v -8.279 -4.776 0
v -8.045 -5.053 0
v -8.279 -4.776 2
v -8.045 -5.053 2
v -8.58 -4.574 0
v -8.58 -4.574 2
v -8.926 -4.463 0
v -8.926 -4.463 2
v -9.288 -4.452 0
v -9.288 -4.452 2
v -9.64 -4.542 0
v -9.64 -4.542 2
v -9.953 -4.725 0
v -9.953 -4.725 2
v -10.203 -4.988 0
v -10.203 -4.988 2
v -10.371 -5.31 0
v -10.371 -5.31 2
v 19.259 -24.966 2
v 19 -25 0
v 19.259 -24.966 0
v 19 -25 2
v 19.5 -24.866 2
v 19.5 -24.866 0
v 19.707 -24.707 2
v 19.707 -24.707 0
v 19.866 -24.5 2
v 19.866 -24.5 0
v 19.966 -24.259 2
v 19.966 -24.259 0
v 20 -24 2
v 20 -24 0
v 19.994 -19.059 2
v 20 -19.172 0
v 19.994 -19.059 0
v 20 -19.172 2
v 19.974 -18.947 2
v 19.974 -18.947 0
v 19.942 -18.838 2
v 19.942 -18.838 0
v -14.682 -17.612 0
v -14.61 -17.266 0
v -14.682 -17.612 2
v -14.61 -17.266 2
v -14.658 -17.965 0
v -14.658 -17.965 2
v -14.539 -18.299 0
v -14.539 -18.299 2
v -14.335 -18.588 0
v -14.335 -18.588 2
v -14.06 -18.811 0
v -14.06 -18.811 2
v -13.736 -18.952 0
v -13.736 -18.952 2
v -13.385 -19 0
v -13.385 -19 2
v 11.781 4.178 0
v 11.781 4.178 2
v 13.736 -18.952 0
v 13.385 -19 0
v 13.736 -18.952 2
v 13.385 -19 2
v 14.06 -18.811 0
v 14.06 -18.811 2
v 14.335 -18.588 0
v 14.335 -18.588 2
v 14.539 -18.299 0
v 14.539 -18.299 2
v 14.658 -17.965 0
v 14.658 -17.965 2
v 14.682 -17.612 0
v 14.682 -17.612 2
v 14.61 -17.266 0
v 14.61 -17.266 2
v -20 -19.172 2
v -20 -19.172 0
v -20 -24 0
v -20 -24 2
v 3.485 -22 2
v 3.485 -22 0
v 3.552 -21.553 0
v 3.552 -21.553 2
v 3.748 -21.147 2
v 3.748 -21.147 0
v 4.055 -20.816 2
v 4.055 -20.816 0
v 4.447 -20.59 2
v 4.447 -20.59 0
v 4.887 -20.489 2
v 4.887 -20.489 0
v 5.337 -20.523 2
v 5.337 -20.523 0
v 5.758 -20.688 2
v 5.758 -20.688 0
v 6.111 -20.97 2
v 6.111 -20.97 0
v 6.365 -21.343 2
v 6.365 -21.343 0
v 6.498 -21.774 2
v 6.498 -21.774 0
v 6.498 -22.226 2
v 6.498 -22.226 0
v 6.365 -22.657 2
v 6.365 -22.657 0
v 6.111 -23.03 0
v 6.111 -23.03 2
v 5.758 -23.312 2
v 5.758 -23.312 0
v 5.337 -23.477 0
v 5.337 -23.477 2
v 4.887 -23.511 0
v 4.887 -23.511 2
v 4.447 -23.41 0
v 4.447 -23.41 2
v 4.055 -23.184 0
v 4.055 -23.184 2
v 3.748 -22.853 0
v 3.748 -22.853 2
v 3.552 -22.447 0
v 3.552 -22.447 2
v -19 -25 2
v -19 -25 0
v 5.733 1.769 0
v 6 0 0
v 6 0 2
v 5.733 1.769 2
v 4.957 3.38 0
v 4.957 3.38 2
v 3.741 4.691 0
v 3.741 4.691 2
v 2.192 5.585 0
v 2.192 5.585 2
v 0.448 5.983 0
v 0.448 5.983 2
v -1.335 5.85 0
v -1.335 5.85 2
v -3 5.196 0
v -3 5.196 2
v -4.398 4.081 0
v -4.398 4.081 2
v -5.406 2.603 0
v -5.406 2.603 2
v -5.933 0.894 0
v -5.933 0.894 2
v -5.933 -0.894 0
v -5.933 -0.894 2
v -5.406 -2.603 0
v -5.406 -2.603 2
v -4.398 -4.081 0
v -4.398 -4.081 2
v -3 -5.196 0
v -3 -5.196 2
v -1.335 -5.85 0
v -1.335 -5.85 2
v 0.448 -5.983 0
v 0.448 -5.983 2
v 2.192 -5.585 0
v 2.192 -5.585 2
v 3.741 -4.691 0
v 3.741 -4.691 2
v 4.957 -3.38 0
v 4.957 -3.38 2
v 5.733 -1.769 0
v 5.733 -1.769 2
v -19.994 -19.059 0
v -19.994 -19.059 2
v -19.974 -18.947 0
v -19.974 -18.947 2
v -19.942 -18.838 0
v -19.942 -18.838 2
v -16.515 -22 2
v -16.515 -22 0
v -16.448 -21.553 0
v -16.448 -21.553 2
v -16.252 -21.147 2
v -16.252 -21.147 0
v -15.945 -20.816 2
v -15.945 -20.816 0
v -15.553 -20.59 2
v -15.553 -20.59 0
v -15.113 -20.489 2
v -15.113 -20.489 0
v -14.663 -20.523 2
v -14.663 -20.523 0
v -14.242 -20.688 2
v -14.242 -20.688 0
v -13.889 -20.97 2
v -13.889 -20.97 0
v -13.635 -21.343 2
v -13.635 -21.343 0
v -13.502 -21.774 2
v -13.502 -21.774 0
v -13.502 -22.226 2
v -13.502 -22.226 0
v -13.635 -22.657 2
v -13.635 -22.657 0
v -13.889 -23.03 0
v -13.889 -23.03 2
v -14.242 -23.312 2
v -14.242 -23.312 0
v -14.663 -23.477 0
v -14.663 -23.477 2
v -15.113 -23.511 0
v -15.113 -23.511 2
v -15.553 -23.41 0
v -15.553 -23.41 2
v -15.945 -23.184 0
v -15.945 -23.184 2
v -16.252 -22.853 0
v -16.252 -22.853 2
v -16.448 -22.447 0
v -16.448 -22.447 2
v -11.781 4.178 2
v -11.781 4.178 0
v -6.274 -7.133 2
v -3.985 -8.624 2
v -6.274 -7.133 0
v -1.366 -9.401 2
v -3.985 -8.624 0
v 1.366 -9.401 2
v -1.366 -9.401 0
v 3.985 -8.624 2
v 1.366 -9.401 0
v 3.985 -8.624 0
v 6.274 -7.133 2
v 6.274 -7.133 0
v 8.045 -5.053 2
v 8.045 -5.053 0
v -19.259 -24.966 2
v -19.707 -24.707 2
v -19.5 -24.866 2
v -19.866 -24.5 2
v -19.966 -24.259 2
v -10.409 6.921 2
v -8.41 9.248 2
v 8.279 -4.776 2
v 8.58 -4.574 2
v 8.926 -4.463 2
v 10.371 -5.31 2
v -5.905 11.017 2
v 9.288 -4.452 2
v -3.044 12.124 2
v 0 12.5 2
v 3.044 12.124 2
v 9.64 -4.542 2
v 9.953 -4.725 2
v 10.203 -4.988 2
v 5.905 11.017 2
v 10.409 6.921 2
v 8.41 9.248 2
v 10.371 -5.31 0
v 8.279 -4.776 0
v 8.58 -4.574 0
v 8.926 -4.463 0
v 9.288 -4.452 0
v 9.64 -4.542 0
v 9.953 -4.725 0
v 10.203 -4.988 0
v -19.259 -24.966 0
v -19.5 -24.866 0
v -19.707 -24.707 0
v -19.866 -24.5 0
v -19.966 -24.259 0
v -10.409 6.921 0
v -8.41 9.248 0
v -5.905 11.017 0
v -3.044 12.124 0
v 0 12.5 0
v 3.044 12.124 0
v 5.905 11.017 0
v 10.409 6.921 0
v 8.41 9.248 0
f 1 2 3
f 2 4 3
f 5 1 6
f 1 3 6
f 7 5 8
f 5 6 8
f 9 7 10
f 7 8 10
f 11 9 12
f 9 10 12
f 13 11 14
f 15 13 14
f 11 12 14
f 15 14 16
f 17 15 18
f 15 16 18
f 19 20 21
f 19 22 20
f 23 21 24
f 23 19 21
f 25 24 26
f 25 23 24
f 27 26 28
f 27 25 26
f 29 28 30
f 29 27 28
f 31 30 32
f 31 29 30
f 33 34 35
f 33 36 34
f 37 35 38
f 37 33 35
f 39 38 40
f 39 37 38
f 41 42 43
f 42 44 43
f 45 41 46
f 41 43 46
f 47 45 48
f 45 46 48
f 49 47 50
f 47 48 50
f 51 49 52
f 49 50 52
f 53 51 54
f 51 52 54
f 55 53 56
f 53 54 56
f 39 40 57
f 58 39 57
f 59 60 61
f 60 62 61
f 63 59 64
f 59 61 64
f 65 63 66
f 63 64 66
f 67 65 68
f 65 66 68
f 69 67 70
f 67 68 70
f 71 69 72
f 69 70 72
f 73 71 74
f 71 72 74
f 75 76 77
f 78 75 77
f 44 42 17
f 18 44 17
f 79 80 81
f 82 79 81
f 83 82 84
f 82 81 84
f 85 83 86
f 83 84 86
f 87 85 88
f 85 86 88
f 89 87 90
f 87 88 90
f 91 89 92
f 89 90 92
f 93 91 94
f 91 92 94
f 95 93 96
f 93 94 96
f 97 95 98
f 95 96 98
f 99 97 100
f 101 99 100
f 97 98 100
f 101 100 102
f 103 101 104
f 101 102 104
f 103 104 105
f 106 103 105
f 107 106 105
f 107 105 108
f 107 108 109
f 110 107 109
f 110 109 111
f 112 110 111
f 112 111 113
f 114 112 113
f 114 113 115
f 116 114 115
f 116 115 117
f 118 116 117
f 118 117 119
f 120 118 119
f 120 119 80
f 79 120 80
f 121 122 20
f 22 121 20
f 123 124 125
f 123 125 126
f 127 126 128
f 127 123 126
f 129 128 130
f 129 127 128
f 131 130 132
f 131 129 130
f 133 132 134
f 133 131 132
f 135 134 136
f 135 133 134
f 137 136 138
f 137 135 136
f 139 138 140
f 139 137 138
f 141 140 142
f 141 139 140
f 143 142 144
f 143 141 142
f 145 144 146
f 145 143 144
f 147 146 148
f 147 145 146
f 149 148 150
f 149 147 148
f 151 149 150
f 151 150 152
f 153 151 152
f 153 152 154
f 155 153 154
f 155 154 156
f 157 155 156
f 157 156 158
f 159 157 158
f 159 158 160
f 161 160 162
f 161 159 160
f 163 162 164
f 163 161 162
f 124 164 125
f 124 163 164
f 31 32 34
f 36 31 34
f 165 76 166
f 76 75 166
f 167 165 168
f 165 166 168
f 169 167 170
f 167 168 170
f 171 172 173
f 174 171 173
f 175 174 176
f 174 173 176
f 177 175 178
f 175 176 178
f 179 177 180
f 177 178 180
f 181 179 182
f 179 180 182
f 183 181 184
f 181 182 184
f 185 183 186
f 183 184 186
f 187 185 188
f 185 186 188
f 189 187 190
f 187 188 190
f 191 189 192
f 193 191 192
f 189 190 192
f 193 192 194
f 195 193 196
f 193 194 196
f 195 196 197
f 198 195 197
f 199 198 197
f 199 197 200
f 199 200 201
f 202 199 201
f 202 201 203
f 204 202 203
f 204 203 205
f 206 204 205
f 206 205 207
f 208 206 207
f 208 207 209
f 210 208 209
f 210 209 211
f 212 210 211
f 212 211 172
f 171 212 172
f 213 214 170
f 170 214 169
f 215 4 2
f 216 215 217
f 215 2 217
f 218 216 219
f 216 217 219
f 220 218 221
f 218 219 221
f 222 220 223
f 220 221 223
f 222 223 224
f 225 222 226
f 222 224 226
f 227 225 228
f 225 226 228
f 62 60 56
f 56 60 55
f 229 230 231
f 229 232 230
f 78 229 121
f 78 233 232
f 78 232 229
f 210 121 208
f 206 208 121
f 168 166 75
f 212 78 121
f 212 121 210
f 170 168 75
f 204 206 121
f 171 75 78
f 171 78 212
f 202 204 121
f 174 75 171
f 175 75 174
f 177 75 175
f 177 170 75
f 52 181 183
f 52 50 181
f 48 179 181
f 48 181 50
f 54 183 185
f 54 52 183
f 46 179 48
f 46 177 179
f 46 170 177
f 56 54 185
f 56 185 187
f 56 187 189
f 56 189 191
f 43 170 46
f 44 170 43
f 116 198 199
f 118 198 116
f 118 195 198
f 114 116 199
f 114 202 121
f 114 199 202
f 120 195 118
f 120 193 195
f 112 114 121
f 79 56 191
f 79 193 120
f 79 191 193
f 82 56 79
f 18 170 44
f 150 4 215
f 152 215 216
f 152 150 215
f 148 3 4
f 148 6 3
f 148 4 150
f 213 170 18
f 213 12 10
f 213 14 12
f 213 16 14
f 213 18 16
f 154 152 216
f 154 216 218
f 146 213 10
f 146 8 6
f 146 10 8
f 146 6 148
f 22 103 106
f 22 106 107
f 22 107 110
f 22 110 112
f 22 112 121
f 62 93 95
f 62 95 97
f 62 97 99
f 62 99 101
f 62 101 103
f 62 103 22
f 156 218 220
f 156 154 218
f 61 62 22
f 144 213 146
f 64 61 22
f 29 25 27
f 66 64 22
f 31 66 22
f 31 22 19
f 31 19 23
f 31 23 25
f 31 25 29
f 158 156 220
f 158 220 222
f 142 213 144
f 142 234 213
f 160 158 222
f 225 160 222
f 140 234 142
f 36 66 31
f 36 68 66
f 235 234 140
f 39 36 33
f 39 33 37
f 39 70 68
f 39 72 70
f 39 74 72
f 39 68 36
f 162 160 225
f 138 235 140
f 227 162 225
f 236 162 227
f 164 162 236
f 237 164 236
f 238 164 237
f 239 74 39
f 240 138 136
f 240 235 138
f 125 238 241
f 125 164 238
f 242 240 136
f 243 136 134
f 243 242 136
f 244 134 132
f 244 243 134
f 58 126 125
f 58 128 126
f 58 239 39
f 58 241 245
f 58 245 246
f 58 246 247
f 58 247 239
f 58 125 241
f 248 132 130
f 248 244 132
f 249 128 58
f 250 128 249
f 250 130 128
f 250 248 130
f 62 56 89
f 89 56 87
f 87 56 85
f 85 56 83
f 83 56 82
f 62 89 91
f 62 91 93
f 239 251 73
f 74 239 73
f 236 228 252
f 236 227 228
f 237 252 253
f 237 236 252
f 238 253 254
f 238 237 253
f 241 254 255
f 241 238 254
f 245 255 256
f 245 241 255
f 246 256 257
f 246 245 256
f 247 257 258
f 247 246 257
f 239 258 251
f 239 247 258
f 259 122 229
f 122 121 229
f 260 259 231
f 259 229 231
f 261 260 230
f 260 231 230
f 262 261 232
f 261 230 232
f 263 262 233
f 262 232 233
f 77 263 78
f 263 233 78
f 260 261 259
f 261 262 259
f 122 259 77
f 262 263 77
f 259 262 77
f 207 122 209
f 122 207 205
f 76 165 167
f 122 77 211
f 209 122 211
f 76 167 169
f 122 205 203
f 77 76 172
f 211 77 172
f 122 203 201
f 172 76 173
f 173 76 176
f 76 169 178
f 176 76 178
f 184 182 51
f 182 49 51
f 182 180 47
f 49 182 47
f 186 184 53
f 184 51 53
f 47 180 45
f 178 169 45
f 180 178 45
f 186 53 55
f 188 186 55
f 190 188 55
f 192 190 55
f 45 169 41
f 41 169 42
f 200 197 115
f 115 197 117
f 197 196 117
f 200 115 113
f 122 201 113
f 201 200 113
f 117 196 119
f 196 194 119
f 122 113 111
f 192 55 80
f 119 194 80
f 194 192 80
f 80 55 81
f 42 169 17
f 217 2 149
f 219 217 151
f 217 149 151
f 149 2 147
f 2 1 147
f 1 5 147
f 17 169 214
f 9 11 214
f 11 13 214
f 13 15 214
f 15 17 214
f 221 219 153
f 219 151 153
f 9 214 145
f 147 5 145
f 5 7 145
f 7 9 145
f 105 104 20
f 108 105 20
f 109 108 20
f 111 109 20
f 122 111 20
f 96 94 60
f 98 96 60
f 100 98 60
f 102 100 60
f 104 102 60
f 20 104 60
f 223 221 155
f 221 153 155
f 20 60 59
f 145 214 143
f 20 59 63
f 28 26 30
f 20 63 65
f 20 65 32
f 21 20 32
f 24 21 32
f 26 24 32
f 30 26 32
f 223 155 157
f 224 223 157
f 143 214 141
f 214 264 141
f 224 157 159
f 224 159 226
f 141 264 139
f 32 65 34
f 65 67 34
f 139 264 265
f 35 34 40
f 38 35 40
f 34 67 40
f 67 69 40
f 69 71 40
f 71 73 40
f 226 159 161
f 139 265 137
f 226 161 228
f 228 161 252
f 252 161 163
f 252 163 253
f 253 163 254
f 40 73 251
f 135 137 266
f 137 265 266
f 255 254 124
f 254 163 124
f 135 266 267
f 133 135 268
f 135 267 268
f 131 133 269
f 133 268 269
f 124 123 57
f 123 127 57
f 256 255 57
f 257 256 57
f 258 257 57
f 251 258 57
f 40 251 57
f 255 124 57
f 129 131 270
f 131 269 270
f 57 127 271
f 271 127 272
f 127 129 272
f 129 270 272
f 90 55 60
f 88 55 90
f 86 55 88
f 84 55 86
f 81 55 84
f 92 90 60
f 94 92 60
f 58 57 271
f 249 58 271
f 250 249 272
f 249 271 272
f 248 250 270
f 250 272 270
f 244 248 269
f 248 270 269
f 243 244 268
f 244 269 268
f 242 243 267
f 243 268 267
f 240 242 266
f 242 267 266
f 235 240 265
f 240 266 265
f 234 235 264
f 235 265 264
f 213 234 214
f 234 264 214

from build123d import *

# Parameters (mm, degrees)
SKETCH_1_R          = 6
EXTRUDE_1_DEPTH     = 2
FILLET_1_R          = 1
SKETCH_2_R          = 1.515
CUT_EXTRUDE_1_DEPTH = 10
CUT_EXTRUDE_2_DEPTH = 10
FILLET_2_R          = 1.3


with BuildPart() as part:
    # 草图1 → 凸台-拉伸1 (new body)
    with BuildSketch(Plane.XY):
        with BuildLine():
            Line((-20, -25), (20, -25))
            Line((20, -25), (20, -19))
            Line((20, -19), (11.781235871, 4.177616707))
            ThreePointArc((11.781235871, 4.177616707), (0, 12.5), (-11.781235871, 4.177616707))
            Line((-11.781235871, 4.177616707), (-20, -19))
            Line((-20, -19), (-20, -25))
        make_face()
        Circle(SKETCH_1_R, mode=Mode.SUBTRACT)
    extrude(amount=EXTRUDE_1_DEPTH)

    # 圆角1
    fillet_1_edges = [part.edges().sort_by_distance(p)[0] for p in [
        (20, -19, 1),
        (20, -25, 1),
        (-20, -25, 1),
        (-20, -19, 1),
    ]]
    fillet(fillet_1_edges, radius=FILLET_1_R)

    # 草图2 → 切除-拉伸1 (cut)
    with BuildSketch(Plane(origin=(0, 0, 0), x_dir=(-1, 0, 0), z_dir=(0, 0, -1))):
        with Locations((15, -22)):
            Circle(SKETCH_2_R)
        with Locations((-5, -22)):
            Circle(SKETCH_2_R)
    extrude(amount=-CUT_EXTRUDE_1_DEPTH, mode=Mode.SUBTRACT)

    # 草图3 → 切除-拉伸2 (cut)
    with BuildSketch(Plane(origin=(0, 0, 0), x_dir=(-1, 0, 0), z_dir=(0, 0, -1))):
        with BuildLine():
            Line((-9.252304266, -2.155195065), (-15.225458465, -19))
            Line((-15.225458465, -19), (15.225458465, -19))
            Line((15.225458465, -19), (9.252304266, -2.155195065))
            ThreePointArc((9.252304266, -2.155195065), (0, -9.5), (-9.252304266, -2.155195065))
        make_face()
    extrude(amount=-CUT_EXTRUDE_2_DEPTH, mode=Mode.SUBTRACT)

    # 圆角2
    fillet_2_edges = [part.edges().sort_by_distance(p)[0] for p in [
        (9.252304266, -2.155195065, 1),
        (-9.252304266, -2.155195065, 1),
        (-15.225458465, -19, 1),
        (15.225458465, -19, 1),
    ]]
    fillet(fillet_2_edges, radius=FILLET_2_R)


solid = part.part
